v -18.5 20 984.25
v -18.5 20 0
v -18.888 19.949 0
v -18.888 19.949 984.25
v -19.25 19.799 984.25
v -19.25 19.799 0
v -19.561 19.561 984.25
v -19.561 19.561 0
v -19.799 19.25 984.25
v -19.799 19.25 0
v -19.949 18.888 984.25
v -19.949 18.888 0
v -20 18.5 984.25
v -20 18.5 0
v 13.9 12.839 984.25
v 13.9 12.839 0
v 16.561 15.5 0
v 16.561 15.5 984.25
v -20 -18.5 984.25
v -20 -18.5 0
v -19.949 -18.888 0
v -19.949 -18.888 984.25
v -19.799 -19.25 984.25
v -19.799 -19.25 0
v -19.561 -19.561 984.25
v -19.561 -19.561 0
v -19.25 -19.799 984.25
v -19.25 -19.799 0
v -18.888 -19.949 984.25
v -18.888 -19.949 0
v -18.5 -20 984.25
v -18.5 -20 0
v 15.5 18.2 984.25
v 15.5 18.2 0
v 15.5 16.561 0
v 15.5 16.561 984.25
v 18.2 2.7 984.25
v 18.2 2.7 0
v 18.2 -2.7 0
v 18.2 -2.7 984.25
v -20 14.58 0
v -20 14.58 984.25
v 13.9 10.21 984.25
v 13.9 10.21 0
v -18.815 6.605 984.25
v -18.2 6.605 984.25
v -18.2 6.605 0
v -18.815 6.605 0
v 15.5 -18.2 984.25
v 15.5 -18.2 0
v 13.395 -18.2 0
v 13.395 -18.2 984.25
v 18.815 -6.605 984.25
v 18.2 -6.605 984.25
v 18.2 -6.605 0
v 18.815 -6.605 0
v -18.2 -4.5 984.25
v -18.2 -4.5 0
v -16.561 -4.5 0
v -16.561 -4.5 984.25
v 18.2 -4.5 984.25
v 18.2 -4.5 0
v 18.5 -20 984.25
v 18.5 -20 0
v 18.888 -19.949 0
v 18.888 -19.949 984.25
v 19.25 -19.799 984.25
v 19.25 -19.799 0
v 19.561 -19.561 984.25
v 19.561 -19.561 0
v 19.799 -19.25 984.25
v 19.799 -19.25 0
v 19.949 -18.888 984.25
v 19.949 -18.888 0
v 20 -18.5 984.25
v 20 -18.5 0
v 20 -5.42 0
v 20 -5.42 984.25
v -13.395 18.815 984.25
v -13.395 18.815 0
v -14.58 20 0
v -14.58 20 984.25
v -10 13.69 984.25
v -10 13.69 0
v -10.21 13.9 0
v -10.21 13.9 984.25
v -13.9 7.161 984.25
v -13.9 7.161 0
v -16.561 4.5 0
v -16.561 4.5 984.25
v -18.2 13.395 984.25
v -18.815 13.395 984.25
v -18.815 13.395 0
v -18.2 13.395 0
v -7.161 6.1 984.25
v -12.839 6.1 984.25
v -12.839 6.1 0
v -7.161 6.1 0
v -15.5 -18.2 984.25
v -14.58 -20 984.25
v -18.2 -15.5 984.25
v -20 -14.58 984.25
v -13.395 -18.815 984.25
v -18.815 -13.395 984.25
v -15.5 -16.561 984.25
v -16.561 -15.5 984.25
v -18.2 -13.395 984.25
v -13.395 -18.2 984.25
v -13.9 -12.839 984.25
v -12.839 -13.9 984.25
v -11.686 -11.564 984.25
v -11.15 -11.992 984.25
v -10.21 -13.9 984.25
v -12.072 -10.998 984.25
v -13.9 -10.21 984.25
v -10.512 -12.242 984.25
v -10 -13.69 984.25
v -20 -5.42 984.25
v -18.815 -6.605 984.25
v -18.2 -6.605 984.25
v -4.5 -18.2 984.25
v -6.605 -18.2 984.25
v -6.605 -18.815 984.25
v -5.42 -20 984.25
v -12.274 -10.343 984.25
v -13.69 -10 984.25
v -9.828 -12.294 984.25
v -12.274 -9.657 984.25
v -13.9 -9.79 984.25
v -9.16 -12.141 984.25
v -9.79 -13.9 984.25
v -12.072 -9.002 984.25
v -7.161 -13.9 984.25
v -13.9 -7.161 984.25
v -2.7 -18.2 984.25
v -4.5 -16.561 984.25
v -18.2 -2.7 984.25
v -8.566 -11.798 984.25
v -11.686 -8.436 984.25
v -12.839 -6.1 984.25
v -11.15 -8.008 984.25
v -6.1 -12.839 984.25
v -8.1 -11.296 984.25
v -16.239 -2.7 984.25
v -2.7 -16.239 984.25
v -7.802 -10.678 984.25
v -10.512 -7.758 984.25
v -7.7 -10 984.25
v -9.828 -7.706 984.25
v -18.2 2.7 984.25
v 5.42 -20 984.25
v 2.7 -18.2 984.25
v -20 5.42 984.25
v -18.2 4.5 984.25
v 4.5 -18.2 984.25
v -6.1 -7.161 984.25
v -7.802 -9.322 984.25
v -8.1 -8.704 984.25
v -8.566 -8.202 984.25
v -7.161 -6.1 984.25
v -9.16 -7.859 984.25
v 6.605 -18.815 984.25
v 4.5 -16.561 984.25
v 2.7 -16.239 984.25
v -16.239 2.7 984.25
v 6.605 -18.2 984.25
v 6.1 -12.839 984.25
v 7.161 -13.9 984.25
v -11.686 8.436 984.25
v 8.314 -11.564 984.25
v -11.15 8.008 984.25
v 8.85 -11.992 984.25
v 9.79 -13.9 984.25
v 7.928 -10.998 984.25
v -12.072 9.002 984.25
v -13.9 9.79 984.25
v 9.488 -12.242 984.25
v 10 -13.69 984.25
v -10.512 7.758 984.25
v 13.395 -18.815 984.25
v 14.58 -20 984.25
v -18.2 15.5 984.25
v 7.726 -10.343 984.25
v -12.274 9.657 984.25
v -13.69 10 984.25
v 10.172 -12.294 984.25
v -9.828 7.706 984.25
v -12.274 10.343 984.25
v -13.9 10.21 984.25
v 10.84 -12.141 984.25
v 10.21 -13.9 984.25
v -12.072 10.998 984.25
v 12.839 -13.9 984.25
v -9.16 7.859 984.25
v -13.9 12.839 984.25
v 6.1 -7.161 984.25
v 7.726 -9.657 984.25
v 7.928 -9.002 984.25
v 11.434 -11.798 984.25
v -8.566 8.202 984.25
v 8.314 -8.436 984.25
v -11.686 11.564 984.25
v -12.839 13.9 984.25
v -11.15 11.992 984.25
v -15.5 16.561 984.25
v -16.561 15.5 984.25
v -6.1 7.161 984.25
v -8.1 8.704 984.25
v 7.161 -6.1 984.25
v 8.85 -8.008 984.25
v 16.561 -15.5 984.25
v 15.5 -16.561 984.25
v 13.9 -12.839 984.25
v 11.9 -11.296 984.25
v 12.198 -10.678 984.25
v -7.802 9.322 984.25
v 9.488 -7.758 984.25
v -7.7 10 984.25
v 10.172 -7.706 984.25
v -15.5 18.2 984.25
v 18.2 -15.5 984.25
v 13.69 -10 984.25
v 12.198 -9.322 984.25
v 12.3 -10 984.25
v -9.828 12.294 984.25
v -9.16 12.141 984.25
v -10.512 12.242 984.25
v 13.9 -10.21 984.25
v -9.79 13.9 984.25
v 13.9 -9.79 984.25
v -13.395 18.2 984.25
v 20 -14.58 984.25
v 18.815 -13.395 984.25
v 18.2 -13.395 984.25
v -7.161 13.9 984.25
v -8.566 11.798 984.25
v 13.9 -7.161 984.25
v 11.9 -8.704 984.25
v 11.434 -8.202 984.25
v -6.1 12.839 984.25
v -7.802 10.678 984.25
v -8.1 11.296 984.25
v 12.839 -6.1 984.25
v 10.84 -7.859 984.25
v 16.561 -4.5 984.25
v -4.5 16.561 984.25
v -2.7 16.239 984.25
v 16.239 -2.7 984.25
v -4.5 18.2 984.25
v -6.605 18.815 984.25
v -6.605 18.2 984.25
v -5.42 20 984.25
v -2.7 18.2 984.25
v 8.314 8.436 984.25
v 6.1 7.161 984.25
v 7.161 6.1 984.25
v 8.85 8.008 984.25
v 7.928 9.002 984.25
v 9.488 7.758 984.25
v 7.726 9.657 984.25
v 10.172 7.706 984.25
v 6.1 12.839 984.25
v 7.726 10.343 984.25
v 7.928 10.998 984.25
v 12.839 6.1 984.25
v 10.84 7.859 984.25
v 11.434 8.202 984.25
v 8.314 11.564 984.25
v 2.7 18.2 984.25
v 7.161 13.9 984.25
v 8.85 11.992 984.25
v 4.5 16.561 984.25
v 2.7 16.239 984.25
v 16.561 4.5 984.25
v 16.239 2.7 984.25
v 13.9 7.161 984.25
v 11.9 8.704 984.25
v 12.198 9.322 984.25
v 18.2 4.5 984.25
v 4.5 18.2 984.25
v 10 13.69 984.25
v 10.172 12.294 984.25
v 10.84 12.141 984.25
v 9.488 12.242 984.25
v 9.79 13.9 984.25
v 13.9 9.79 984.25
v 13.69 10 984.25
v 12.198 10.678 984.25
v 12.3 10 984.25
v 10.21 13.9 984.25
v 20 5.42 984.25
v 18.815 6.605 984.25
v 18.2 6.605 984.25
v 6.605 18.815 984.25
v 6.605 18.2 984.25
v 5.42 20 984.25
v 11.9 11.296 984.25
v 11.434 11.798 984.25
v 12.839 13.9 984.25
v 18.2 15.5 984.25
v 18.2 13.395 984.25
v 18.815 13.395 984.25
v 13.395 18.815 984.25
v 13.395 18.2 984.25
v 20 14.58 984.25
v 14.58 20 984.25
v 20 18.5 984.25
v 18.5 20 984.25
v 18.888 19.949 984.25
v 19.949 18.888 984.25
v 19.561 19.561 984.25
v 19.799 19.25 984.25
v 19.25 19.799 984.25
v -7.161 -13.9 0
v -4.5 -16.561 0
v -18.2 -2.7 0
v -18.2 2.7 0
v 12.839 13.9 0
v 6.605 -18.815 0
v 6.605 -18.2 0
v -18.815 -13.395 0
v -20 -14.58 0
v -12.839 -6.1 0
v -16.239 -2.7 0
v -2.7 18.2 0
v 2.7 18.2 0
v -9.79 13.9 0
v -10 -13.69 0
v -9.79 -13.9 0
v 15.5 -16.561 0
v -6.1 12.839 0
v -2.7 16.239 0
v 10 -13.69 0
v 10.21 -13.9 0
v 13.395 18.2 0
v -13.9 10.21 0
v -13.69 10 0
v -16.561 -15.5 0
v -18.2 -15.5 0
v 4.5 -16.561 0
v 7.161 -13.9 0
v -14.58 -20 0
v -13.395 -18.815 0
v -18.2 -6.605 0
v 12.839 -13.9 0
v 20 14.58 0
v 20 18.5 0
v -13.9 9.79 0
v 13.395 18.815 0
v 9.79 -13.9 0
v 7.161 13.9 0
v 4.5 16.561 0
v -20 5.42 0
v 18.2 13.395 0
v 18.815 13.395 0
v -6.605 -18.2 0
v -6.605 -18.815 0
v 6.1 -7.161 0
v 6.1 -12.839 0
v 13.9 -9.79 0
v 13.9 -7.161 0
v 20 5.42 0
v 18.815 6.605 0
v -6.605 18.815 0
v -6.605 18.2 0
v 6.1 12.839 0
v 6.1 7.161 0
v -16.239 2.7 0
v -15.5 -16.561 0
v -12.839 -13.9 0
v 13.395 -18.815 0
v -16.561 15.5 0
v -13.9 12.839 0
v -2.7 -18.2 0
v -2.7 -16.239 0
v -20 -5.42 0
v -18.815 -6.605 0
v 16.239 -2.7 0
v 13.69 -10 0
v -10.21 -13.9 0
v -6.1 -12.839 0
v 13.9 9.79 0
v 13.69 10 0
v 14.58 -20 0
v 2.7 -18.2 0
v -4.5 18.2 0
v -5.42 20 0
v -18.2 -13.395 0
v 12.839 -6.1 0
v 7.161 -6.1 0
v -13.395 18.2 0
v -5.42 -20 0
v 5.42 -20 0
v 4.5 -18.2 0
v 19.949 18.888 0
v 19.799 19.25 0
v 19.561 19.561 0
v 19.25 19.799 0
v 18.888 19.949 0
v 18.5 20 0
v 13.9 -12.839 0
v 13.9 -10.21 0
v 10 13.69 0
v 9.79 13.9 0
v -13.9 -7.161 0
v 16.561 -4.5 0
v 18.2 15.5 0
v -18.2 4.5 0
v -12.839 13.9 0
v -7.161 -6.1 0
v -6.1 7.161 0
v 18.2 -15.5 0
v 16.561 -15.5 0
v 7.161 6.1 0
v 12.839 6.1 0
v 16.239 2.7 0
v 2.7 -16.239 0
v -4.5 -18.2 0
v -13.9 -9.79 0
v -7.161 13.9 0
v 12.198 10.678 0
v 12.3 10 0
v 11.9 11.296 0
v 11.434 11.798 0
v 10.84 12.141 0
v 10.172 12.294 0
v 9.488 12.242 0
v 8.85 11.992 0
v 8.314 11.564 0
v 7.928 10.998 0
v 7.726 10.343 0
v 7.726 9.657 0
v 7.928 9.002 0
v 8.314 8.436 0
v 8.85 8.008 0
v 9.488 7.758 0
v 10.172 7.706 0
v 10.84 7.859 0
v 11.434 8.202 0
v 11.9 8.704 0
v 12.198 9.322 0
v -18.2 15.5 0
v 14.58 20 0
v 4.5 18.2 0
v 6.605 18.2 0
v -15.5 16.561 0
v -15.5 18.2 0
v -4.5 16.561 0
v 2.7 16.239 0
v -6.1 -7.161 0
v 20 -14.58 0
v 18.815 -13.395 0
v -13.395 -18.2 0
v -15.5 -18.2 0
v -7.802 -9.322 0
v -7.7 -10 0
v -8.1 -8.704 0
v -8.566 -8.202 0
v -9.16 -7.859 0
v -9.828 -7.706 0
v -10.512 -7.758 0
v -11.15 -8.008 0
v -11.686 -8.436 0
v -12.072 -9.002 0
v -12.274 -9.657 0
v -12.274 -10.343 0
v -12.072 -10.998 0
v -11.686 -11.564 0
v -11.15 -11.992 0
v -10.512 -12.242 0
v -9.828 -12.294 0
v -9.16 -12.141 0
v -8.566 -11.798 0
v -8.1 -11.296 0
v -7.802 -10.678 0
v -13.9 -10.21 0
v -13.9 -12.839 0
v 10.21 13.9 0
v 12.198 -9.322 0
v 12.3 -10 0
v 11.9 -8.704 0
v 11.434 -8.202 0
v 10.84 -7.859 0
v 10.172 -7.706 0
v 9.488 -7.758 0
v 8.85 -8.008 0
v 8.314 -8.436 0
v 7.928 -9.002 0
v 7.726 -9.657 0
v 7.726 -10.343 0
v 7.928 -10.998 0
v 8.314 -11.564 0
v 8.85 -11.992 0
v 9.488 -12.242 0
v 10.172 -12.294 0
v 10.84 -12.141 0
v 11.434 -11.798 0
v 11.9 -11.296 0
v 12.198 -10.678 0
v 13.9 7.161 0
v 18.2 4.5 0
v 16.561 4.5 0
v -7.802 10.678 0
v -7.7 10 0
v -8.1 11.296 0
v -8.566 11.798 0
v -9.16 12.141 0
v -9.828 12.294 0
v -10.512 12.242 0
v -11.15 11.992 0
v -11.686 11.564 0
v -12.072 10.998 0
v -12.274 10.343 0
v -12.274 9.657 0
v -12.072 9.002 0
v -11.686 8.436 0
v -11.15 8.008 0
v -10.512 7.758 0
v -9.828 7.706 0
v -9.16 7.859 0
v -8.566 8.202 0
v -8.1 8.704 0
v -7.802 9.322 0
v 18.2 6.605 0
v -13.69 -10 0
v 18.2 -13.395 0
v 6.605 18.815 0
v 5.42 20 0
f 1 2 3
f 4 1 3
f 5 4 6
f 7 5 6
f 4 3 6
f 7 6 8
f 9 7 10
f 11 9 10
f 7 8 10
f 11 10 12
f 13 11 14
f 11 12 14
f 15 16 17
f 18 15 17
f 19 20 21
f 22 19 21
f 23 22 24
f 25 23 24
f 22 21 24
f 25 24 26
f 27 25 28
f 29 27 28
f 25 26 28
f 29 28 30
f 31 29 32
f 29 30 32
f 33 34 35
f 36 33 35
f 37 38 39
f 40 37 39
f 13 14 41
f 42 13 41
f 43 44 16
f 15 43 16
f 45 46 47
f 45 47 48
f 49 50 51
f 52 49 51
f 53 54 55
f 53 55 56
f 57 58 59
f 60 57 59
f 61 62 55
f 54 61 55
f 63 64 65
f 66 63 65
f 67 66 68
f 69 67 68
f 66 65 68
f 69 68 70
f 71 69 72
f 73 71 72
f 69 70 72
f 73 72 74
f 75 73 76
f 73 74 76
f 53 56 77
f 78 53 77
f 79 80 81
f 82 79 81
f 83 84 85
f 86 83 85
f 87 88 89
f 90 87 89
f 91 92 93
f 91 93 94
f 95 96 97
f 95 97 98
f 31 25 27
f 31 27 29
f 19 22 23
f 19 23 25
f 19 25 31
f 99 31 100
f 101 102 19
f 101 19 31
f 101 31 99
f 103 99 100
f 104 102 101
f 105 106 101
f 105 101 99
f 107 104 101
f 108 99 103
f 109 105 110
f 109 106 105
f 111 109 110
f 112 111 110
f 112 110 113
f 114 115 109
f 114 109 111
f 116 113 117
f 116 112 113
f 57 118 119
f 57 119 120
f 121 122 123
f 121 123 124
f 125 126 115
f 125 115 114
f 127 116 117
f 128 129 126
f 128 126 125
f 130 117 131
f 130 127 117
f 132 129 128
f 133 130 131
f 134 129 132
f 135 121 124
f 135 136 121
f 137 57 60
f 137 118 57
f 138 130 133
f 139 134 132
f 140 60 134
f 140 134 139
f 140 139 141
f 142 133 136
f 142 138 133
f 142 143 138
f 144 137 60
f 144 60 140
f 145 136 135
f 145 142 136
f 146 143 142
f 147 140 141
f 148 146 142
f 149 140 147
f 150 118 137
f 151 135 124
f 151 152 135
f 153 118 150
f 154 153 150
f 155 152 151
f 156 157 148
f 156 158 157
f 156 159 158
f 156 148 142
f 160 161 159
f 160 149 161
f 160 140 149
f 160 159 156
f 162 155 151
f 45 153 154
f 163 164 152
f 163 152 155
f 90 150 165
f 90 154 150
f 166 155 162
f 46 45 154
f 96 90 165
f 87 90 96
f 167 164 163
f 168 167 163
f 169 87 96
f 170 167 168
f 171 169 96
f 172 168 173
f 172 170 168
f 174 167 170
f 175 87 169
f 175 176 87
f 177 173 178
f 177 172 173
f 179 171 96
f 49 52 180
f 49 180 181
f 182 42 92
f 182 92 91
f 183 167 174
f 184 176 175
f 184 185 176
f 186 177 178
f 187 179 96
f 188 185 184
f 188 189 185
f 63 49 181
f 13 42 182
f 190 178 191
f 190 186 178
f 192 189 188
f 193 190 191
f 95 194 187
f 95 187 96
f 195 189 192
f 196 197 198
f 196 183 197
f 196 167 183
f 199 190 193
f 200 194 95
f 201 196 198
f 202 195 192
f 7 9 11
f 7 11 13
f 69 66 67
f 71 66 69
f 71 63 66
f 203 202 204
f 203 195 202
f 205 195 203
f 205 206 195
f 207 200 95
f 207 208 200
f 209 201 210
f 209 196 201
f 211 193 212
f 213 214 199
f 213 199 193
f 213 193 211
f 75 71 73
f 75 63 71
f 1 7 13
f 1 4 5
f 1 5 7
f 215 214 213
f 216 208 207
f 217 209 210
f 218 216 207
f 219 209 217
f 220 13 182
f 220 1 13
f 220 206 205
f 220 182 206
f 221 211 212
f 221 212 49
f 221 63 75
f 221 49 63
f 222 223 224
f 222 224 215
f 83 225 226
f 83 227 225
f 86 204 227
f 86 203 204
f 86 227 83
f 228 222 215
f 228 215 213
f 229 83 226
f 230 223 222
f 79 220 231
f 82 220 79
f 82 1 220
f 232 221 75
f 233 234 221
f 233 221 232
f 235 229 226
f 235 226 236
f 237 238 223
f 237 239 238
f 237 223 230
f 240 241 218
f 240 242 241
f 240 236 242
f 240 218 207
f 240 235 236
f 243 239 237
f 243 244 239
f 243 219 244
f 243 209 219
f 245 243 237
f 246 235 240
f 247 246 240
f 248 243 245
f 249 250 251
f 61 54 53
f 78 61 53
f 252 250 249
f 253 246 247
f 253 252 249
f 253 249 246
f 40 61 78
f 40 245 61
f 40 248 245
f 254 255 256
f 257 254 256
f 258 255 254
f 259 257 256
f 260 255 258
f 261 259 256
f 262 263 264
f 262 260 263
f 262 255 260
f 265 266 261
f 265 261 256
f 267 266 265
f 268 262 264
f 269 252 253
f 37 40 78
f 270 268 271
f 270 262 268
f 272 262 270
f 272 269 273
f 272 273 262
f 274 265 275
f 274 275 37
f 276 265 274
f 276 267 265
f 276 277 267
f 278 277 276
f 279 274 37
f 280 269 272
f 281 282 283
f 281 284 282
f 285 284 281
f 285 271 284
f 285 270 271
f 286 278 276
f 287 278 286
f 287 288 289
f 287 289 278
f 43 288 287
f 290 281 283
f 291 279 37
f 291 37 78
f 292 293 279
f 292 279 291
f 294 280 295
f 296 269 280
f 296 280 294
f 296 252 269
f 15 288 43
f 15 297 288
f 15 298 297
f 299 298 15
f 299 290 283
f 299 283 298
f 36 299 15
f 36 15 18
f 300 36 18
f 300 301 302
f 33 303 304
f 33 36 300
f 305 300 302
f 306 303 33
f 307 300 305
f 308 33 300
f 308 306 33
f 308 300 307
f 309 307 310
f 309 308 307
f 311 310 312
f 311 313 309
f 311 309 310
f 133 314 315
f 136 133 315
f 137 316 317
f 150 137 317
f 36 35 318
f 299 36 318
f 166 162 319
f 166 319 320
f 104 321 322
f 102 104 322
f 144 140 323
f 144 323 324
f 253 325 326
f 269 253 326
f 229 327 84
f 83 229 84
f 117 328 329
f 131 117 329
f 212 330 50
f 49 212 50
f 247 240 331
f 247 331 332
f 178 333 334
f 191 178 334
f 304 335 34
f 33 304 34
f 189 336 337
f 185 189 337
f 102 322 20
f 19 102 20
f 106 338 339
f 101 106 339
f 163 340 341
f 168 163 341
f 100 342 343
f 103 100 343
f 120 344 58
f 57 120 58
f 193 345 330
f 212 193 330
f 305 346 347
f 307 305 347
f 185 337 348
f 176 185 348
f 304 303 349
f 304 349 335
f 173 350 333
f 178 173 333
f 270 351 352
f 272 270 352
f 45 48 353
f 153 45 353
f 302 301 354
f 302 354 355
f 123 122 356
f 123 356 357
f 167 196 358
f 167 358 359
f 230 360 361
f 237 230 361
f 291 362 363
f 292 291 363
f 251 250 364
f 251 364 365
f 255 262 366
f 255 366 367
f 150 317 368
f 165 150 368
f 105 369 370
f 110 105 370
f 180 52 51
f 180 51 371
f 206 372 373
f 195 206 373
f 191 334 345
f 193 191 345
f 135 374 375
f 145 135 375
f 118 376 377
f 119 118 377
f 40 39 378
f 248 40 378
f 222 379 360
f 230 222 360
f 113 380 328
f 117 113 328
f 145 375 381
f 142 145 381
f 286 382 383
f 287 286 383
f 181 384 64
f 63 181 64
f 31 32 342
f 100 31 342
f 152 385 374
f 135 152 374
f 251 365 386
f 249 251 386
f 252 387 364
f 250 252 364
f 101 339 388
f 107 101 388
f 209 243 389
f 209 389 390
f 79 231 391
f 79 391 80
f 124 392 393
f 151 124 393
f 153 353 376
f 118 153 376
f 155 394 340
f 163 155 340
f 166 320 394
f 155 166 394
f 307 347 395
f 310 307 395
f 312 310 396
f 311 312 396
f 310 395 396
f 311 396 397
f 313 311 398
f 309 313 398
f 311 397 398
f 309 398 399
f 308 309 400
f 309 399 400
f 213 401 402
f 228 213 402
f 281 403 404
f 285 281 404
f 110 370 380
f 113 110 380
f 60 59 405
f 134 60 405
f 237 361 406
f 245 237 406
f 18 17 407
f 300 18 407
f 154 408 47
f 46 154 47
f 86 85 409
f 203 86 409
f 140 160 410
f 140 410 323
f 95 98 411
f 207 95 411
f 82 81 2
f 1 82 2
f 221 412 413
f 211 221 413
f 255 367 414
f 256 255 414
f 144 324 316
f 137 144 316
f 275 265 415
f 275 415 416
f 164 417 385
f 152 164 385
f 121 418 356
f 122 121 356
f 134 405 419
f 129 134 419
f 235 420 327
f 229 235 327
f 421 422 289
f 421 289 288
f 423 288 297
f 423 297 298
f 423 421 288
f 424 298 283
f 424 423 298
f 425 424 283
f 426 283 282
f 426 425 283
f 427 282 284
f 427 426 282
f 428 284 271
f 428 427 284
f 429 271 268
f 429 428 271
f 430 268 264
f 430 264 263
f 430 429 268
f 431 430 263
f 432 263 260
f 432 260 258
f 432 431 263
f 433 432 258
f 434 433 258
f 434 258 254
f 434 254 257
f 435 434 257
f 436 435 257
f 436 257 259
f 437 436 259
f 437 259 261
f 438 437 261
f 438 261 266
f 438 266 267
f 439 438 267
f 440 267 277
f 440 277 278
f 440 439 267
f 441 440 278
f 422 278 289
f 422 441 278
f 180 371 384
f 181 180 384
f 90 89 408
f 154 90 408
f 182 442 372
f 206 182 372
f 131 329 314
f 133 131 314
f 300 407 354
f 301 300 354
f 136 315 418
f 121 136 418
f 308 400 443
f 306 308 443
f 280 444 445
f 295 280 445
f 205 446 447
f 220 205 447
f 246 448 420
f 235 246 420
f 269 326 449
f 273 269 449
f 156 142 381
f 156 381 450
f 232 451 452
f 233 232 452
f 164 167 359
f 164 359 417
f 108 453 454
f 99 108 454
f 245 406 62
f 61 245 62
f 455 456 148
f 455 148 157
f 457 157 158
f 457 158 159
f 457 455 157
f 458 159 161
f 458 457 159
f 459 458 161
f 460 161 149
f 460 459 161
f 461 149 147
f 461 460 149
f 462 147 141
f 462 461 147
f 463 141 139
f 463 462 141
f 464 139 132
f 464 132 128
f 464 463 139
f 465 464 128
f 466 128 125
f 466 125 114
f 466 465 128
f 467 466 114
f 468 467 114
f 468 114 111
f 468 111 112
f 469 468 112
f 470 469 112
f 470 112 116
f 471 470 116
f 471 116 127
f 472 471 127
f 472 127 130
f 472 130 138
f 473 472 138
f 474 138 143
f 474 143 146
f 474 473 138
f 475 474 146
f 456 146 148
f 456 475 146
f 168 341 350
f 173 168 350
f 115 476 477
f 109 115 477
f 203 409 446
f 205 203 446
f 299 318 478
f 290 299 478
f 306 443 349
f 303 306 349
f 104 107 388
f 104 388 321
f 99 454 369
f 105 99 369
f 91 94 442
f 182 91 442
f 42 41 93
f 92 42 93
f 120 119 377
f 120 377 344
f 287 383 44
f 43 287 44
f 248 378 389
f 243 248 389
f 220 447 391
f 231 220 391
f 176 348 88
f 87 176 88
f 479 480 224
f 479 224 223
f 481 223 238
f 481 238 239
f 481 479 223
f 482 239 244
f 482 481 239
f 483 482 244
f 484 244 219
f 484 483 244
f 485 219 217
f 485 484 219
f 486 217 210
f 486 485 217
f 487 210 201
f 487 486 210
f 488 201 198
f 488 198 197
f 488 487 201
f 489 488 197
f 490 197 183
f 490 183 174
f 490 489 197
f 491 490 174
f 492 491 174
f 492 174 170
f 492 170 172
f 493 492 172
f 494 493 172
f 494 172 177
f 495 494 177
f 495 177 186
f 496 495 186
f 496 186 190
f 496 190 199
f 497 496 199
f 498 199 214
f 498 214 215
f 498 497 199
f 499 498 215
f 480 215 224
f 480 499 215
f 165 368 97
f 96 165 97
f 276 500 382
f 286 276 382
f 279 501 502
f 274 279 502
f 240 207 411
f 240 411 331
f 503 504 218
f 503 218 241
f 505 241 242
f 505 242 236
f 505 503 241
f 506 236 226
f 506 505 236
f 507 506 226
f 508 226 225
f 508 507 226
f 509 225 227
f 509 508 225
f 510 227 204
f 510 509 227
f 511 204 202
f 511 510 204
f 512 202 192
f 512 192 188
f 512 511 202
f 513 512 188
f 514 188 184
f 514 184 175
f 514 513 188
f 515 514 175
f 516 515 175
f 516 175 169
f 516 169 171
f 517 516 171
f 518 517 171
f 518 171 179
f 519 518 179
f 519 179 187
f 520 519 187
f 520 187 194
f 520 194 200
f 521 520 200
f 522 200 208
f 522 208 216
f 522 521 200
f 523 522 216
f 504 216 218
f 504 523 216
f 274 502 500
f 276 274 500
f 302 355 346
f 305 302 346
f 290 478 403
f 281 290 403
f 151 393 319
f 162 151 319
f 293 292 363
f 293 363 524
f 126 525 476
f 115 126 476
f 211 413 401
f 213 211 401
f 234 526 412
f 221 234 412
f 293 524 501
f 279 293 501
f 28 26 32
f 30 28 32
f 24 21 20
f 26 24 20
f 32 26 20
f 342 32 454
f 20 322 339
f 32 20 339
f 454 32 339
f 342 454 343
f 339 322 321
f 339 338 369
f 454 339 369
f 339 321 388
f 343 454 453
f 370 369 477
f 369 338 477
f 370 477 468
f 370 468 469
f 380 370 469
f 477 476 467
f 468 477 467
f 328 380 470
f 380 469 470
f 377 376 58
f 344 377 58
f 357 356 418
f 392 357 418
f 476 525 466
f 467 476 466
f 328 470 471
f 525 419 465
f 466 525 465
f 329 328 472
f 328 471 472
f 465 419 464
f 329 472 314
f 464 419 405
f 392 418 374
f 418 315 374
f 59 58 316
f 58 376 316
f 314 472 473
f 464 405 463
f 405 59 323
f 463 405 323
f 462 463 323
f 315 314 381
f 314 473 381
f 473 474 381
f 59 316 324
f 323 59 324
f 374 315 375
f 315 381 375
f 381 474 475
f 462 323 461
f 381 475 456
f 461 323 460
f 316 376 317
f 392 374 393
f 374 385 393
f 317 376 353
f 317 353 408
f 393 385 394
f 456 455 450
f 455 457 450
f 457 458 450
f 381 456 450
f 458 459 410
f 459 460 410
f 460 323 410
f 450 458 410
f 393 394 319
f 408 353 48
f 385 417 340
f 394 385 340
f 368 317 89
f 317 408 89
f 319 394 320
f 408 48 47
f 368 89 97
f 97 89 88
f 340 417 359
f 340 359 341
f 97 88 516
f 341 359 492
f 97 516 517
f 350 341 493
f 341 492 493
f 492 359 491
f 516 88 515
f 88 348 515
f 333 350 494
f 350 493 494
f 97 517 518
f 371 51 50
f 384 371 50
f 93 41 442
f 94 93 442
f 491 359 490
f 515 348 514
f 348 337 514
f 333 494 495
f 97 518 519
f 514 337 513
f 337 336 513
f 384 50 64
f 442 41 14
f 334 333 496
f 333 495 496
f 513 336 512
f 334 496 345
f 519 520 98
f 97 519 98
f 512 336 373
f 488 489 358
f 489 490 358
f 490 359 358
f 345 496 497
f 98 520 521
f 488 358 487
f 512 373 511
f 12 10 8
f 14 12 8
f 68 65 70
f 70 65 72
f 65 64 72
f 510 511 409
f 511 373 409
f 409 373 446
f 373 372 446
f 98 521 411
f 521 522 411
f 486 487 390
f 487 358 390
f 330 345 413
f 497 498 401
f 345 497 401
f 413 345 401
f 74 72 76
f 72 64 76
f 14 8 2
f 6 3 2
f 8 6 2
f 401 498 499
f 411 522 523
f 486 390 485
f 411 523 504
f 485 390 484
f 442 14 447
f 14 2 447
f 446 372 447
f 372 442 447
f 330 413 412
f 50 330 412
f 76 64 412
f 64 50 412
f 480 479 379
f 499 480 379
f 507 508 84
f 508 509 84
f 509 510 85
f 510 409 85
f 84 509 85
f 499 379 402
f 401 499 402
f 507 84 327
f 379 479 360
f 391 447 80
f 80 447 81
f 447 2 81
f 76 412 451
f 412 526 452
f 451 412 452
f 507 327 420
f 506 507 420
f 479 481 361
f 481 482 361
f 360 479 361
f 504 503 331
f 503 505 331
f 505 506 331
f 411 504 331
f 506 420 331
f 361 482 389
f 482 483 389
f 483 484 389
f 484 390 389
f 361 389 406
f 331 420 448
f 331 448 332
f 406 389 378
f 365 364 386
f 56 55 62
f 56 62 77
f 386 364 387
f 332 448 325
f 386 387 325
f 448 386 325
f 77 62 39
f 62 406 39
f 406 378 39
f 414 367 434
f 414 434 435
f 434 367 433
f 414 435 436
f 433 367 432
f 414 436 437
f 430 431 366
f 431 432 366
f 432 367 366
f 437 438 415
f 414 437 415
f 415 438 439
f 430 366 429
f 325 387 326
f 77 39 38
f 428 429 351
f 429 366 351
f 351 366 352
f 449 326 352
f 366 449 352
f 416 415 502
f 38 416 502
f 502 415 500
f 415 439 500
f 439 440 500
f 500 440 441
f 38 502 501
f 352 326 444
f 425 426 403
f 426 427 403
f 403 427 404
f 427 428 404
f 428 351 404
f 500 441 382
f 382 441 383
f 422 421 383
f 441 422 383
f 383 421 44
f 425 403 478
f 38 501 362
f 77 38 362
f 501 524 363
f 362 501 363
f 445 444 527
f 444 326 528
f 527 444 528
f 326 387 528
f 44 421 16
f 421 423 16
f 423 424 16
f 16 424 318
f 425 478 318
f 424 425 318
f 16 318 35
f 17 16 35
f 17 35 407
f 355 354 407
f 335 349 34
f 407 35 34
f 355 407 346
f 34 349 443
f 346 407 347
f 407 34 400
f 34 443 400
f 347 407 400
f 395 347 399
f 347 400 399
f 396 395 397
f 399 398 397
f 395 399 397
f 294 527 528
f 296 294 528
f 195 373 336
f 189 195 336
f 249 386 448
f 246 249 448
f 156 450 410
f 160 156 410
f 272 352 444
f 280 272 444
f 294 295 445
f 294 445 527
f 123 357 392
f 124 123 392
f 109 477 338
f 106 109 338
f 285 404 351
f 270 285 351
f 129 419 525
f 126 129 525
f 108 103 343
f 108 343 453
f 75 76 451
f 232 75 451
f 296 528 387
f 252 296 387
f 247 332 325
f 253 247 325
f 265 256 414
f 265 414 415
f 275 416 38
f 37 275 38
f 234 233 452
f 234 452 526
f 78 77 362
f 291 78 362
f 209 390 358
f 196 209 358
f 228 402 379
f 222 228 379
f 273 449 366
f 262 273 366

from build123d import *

# Parameters (mm, degrees)
SKETCH1_R           = 2.3
BOSS_EXTRUDE1_DEPTH = 984.25


with BuildPart() as part:
    # Sketch1 → Boss-Extrude1 (new body)
    with BuildSketch(Plane.XY):
        with BuildLine():
            Line((14.58, -20), (18.5, -20))
            ThreePointArc((18.5, -20), (19.560660172, -19.560660172), (20, -18.5))
            Line((20, -18.5), (20, -14.58))
            Line((20, -14.58), (18.815, -13.395))
            Line((18.815, -13.395), (18.2, -13.395))
            Line((18.2, -13.395), (18.2, -15.5))
            Line((18.2, -15.5), (16.560660172, -15.5))
            Line((16.560660172, -15.5), (13.9, -12.839339828))
            Line((13.9, -12.839339828), (13.9, -10.21))
            Line((13.9, -10.21), (13.69, -10))
            Line((13.69, -10), (13.9, -9.79))
            Line((13.9, -9.79), (13.9, -7.160660172))
            Line((13.9, -7.160660172), (16.560660172, -4.5))
            Line((16.560660172, -4.5), (18.2, -4.5))
            Line((18.2, -4.5), (18.2, -6.605))
            Line((18.2, -6.605), (18.815, -6.605))
            Line((18.815, -6.605), (20, -5.42))
            Line((20, -5.42), (20, 5.42))
            Line((20, 5.42), (18.815, 6.605))
            Line((18.815, 6.605), (18.2, 6.605))
            Line((18.2, 6.605), (18.2, 4.5))
            Line((18.2, 4.5), (16.560660172, 4.5))
            Line((16.560660172, 4.5), (13.9, 7.160660172))
            Line((13.9, 7.160660172), (13.9, 9.79))
            Line((13.9, 9.79), (13.69, 10))
            Line((13.69, 10), (13.9, 10.21))
            Line((13.9, 10.21), (13.9, 12.839339828))
            Line((13.9, 12.839339828), (16.560660172, 15.5))
            Line((16.560660172, 15.5), (18.2, 15.5))
            Line((18.2, 15.5), (18.2, 13.395))
            Line((18.2, 13.395), (18.815, 13.395))
            Line((18.815, 13.395), (20, 14.58))
            Line((20, 14.58), (20, 18.5))
            ThreePointArc((20, 18.5), (19.560660172, 19.560660172), (18.5, 20))
            Line((18.5, 20), (14.58, 20))
            Line((14.58, 20), (13.395, 18.815))
            Line((13.395, 18.815), (13.395, 18.2))
            Line((13.395, 18.2), (15.5, 18.2))
            Line((15.5, 18.2), (15.5, 16.560660172))
            Line((15.5, 16.560660172), (12.839339828, 13.9))
            Line((12.839339828, 13.9), (10.21, 13.9))
            Line((10.21, 13.9), (10, 13.69))
            Line((10, 13.69), (9.79, 13.9))
            Line((9.79, 13.9), (7.160660172, 13.9))
            Line((7.160660172, 13.9), (4.5, 16.560660172))
            Line((4.5, 16.560660172), (4.5, 18.2))
            Line((4.5, 18.2), (6.605, 18.2))
            Line((6.605, 18.2), (6.605, 18.815))
            Line((6.605, 18.815), (5.42, 20))
            Line((5.42, 20), (-5.42, 20))
            Line((-5.42, 20), (-6.605, 18.815))
            Line((-6.605, 18.815), (-6.605, 18.2))
            Line((-6.605, 18.2), (-4.5, 18.2))
            Line((-4.5, 18.2), (-4.5, 16.560660172))
            Line((-4.5, 16.560660172), (-7.160660172, 13.9))
            Line((-7.160660172, 13.9), (-9.79, 13.9))
            Line((-9.79, 13.9), (-10, 13.69))
            Line((-10, 13.69), (-10.21, 13.9))
            Line((-10.21, 13.9), (-12.839339828, 13.9))
            Line((-12.839339828, 13.9), (-15.5, 16.560660172))
            Line((-15.5, 16.560660172), (-15.5, 18.2))
            Line((-15.5, 18.2), (-13.395, 18.2))
            Line((-13.395, 18.2), (-13.395, 18.815))
            Line((-13.395, 18.815), (-14.58, 20))
            Line((-14.58, 20), (-18.5, 20))
            ThreePointArc((-18.5, 20), (-19.560660172, 19.560660172), (-20, 18.5))
            Line((-20, 18.5), (-20, 14.58))
            Line((-20, 14.58), (-18.815, 13.395))
            Line((-18.815, 13.395), (-18.2, 13.395))
            Line((-18.2, 13.395), (-18.2, 15.5))
            Line((-18.2, 15.5), (-16.560660172, 15.5))
            Line((-16.560660172, 15.5), (-13.9, 12.839339828))
            Line((-13.9, 12.839339828), (-13.9, 10.21))
            Line((-13.9, 10.21), (-13.69, 10))
            Line((-13.69, 10), (-13.9, 9.79))
            Line((-13.9, 9.79), (-13.9, 7.160660172))
            Line((-13.9, 7.160660172), (-16.560660172, 4.5))
            Line((-16.560660172, 4.5), (-18.2, 4.5))
            Line((-18.2, 4.5), (-18.2, 6.605))
            Line((-18.2, 6.605), (-18.815, 6.605))
            Line((-18.815, 6.605), (-20, 5.42))
            Line((-20, 5.42), (-20, -5.42))
            Line((-20, -5.42), (-18.815, -6.605))
            Line((-18.815, -6.605), (-18.2, -6.605))
            Line((-18.2, -6.605), (-18.2, -4.5))
            Line((-18.2, -4.5), (-16.560660172, -4.5))
            Line((-16.560660172, -4.5), (-13.9, -7.160660172))
            Line((-13.9, -7.160660172), (-13.9, -9.79))
            Line((-13.9, -9.79), (-13.69, -10))
            Line((-13.69, -10), (-13.9, -10.21))
            Line((-13.9, -10.21), (-13.9, -12.839339828))
            Line((-13.9, -12.839339828), (-16.560660172, -15.5))
            Line((-16.560660172, -15.5), (-18.2, -15.5))
            Line((-18.2, -15.5), (-18.2, -13.395))
            Line((-18.2, -13.395), (-18.815, -13.395))
            Line((-18.815, -13.395), (-20, -14.58))
            Line((-20, -14.58), (-20, -18.5))
            ThreePointArc((-20, -18.5), (-19.560660172, -19.560660172), (-18.5, -20))
            Line((-18.5, -20), (-14.58, -20))
            Line((-14.58, -20), (-13.395, -18.815))
            Line((-13.395, -18.815), (-13.395, -18.2))
            Line((-13.395, -18.2), (-15.5, -18.2))
            Line((-15.5, -18.2), (-15.5, -16.560660172))
            Line((-15.5, -16.560660172), (-12.839339828, -13.9))
            Line((-12.839339828, -13.9), (-10.21, -13.9))
            Line((-10.21, -13.9), (-10, -13.69))
            Line((-10, -13.69), (-9.79, -13.9))
            Line((-9.79, -13.9), (-7.160660172, -13.9))
            Line((-7.160660172, -13.9), (-4.5, -16.560660172))
            Line((-4.5, -16.560660172), (-4.5, -18.2))
            Line((-4.5, -18.2), (-6.605, -18.2))
            Line((-6.605, -18.2), (-6.605, -18.815))
            Line((-6.605, -18.815), (-5.42, -20))
            Line((-5.42, -20), (5.42, -20))
            Line((5.42, -20), (6.605, -18.815))
            Line((6.605, -18.815), (6.605, -18.2))
            Line((6.605, -18.2), (4.5, -18.2))
            Line((4.5, -18.2), (4.5, -16.560660172))
            Line((4.5, -16.560660172), (7.160660172, -13.9))
            Line((7.160660172, -13.9), (9.79, -13.9))
            Line((9.79, -13.9), (10, -13.69))
            Line((10, -13.69), (10.21, -13.9))
            Line((10.21, -13.9), (12.839339828, -13.9))
            Line((12.839339828, -13.9), (15.5, -16.560660172))
            Line((15.5, -16.560660172), (15.5, -18.2))
            Line((15.5, -18.2), (13.395, -18.2))
            Line((13.395, -18.2), (13.395, -18.815))
            Line((13.395, -18.815), (14.58, -20))
        make_face()
        with Locations((-10, -10)):
            Circle(SKETCH1_R, mode=Mode.SUBTRACT)
        with Locations((10, -10)):
            Circle(SKETCH1_R, mode=Mode.SUBTRACT)
        Polygon((-16.239339828, -2.7), (-18.2, -2.7), (-18.2, 2.7), (-16.239339828, 2.7), (-12.839339828, 6.1), (-7.160660172, 6.1), (-6.1, 7.160660172), (-6.1, 12.839339828), (-2.7, 16.239339828), (-2.7, 18.2), (2.7, 18.2), (2.7, 16.239339828), (6.1, 12.839339828), (6.1, 7.160660172), (7.160660172, 6.1), (12.839339828, 6.1), (16.239339828, 2.7), (18.2, 2.7), (18.2, -2.7), (16.239339828, -2.7), (12.839339828, -6.1), (7.160660172, -6.1), (6.1, -7.160660172), (6.1, -12.839339828), (2.7, -16.239339828), (2.7, -18.2), (-2.7, -18.2), (-2.7, -16.239339828), (-6.1, -12.839339828), (-6.1, -7.160660172), (-7.160660172, -6.1), (-12.839339828, -6.1), align=None, mode=Mode.SUBTRACT)
        with Locations((-10, 10)):
            Circle(SKETCH1_R, mode=Mode.SUBTRACT)
        with Locations((10, 10)):
            Circle(SKETCH1_R, mode=Mode.SUBTRACT)
    extrude(amount=BOSS_EXTRUDE1_DEPTH)


solid = part.part
